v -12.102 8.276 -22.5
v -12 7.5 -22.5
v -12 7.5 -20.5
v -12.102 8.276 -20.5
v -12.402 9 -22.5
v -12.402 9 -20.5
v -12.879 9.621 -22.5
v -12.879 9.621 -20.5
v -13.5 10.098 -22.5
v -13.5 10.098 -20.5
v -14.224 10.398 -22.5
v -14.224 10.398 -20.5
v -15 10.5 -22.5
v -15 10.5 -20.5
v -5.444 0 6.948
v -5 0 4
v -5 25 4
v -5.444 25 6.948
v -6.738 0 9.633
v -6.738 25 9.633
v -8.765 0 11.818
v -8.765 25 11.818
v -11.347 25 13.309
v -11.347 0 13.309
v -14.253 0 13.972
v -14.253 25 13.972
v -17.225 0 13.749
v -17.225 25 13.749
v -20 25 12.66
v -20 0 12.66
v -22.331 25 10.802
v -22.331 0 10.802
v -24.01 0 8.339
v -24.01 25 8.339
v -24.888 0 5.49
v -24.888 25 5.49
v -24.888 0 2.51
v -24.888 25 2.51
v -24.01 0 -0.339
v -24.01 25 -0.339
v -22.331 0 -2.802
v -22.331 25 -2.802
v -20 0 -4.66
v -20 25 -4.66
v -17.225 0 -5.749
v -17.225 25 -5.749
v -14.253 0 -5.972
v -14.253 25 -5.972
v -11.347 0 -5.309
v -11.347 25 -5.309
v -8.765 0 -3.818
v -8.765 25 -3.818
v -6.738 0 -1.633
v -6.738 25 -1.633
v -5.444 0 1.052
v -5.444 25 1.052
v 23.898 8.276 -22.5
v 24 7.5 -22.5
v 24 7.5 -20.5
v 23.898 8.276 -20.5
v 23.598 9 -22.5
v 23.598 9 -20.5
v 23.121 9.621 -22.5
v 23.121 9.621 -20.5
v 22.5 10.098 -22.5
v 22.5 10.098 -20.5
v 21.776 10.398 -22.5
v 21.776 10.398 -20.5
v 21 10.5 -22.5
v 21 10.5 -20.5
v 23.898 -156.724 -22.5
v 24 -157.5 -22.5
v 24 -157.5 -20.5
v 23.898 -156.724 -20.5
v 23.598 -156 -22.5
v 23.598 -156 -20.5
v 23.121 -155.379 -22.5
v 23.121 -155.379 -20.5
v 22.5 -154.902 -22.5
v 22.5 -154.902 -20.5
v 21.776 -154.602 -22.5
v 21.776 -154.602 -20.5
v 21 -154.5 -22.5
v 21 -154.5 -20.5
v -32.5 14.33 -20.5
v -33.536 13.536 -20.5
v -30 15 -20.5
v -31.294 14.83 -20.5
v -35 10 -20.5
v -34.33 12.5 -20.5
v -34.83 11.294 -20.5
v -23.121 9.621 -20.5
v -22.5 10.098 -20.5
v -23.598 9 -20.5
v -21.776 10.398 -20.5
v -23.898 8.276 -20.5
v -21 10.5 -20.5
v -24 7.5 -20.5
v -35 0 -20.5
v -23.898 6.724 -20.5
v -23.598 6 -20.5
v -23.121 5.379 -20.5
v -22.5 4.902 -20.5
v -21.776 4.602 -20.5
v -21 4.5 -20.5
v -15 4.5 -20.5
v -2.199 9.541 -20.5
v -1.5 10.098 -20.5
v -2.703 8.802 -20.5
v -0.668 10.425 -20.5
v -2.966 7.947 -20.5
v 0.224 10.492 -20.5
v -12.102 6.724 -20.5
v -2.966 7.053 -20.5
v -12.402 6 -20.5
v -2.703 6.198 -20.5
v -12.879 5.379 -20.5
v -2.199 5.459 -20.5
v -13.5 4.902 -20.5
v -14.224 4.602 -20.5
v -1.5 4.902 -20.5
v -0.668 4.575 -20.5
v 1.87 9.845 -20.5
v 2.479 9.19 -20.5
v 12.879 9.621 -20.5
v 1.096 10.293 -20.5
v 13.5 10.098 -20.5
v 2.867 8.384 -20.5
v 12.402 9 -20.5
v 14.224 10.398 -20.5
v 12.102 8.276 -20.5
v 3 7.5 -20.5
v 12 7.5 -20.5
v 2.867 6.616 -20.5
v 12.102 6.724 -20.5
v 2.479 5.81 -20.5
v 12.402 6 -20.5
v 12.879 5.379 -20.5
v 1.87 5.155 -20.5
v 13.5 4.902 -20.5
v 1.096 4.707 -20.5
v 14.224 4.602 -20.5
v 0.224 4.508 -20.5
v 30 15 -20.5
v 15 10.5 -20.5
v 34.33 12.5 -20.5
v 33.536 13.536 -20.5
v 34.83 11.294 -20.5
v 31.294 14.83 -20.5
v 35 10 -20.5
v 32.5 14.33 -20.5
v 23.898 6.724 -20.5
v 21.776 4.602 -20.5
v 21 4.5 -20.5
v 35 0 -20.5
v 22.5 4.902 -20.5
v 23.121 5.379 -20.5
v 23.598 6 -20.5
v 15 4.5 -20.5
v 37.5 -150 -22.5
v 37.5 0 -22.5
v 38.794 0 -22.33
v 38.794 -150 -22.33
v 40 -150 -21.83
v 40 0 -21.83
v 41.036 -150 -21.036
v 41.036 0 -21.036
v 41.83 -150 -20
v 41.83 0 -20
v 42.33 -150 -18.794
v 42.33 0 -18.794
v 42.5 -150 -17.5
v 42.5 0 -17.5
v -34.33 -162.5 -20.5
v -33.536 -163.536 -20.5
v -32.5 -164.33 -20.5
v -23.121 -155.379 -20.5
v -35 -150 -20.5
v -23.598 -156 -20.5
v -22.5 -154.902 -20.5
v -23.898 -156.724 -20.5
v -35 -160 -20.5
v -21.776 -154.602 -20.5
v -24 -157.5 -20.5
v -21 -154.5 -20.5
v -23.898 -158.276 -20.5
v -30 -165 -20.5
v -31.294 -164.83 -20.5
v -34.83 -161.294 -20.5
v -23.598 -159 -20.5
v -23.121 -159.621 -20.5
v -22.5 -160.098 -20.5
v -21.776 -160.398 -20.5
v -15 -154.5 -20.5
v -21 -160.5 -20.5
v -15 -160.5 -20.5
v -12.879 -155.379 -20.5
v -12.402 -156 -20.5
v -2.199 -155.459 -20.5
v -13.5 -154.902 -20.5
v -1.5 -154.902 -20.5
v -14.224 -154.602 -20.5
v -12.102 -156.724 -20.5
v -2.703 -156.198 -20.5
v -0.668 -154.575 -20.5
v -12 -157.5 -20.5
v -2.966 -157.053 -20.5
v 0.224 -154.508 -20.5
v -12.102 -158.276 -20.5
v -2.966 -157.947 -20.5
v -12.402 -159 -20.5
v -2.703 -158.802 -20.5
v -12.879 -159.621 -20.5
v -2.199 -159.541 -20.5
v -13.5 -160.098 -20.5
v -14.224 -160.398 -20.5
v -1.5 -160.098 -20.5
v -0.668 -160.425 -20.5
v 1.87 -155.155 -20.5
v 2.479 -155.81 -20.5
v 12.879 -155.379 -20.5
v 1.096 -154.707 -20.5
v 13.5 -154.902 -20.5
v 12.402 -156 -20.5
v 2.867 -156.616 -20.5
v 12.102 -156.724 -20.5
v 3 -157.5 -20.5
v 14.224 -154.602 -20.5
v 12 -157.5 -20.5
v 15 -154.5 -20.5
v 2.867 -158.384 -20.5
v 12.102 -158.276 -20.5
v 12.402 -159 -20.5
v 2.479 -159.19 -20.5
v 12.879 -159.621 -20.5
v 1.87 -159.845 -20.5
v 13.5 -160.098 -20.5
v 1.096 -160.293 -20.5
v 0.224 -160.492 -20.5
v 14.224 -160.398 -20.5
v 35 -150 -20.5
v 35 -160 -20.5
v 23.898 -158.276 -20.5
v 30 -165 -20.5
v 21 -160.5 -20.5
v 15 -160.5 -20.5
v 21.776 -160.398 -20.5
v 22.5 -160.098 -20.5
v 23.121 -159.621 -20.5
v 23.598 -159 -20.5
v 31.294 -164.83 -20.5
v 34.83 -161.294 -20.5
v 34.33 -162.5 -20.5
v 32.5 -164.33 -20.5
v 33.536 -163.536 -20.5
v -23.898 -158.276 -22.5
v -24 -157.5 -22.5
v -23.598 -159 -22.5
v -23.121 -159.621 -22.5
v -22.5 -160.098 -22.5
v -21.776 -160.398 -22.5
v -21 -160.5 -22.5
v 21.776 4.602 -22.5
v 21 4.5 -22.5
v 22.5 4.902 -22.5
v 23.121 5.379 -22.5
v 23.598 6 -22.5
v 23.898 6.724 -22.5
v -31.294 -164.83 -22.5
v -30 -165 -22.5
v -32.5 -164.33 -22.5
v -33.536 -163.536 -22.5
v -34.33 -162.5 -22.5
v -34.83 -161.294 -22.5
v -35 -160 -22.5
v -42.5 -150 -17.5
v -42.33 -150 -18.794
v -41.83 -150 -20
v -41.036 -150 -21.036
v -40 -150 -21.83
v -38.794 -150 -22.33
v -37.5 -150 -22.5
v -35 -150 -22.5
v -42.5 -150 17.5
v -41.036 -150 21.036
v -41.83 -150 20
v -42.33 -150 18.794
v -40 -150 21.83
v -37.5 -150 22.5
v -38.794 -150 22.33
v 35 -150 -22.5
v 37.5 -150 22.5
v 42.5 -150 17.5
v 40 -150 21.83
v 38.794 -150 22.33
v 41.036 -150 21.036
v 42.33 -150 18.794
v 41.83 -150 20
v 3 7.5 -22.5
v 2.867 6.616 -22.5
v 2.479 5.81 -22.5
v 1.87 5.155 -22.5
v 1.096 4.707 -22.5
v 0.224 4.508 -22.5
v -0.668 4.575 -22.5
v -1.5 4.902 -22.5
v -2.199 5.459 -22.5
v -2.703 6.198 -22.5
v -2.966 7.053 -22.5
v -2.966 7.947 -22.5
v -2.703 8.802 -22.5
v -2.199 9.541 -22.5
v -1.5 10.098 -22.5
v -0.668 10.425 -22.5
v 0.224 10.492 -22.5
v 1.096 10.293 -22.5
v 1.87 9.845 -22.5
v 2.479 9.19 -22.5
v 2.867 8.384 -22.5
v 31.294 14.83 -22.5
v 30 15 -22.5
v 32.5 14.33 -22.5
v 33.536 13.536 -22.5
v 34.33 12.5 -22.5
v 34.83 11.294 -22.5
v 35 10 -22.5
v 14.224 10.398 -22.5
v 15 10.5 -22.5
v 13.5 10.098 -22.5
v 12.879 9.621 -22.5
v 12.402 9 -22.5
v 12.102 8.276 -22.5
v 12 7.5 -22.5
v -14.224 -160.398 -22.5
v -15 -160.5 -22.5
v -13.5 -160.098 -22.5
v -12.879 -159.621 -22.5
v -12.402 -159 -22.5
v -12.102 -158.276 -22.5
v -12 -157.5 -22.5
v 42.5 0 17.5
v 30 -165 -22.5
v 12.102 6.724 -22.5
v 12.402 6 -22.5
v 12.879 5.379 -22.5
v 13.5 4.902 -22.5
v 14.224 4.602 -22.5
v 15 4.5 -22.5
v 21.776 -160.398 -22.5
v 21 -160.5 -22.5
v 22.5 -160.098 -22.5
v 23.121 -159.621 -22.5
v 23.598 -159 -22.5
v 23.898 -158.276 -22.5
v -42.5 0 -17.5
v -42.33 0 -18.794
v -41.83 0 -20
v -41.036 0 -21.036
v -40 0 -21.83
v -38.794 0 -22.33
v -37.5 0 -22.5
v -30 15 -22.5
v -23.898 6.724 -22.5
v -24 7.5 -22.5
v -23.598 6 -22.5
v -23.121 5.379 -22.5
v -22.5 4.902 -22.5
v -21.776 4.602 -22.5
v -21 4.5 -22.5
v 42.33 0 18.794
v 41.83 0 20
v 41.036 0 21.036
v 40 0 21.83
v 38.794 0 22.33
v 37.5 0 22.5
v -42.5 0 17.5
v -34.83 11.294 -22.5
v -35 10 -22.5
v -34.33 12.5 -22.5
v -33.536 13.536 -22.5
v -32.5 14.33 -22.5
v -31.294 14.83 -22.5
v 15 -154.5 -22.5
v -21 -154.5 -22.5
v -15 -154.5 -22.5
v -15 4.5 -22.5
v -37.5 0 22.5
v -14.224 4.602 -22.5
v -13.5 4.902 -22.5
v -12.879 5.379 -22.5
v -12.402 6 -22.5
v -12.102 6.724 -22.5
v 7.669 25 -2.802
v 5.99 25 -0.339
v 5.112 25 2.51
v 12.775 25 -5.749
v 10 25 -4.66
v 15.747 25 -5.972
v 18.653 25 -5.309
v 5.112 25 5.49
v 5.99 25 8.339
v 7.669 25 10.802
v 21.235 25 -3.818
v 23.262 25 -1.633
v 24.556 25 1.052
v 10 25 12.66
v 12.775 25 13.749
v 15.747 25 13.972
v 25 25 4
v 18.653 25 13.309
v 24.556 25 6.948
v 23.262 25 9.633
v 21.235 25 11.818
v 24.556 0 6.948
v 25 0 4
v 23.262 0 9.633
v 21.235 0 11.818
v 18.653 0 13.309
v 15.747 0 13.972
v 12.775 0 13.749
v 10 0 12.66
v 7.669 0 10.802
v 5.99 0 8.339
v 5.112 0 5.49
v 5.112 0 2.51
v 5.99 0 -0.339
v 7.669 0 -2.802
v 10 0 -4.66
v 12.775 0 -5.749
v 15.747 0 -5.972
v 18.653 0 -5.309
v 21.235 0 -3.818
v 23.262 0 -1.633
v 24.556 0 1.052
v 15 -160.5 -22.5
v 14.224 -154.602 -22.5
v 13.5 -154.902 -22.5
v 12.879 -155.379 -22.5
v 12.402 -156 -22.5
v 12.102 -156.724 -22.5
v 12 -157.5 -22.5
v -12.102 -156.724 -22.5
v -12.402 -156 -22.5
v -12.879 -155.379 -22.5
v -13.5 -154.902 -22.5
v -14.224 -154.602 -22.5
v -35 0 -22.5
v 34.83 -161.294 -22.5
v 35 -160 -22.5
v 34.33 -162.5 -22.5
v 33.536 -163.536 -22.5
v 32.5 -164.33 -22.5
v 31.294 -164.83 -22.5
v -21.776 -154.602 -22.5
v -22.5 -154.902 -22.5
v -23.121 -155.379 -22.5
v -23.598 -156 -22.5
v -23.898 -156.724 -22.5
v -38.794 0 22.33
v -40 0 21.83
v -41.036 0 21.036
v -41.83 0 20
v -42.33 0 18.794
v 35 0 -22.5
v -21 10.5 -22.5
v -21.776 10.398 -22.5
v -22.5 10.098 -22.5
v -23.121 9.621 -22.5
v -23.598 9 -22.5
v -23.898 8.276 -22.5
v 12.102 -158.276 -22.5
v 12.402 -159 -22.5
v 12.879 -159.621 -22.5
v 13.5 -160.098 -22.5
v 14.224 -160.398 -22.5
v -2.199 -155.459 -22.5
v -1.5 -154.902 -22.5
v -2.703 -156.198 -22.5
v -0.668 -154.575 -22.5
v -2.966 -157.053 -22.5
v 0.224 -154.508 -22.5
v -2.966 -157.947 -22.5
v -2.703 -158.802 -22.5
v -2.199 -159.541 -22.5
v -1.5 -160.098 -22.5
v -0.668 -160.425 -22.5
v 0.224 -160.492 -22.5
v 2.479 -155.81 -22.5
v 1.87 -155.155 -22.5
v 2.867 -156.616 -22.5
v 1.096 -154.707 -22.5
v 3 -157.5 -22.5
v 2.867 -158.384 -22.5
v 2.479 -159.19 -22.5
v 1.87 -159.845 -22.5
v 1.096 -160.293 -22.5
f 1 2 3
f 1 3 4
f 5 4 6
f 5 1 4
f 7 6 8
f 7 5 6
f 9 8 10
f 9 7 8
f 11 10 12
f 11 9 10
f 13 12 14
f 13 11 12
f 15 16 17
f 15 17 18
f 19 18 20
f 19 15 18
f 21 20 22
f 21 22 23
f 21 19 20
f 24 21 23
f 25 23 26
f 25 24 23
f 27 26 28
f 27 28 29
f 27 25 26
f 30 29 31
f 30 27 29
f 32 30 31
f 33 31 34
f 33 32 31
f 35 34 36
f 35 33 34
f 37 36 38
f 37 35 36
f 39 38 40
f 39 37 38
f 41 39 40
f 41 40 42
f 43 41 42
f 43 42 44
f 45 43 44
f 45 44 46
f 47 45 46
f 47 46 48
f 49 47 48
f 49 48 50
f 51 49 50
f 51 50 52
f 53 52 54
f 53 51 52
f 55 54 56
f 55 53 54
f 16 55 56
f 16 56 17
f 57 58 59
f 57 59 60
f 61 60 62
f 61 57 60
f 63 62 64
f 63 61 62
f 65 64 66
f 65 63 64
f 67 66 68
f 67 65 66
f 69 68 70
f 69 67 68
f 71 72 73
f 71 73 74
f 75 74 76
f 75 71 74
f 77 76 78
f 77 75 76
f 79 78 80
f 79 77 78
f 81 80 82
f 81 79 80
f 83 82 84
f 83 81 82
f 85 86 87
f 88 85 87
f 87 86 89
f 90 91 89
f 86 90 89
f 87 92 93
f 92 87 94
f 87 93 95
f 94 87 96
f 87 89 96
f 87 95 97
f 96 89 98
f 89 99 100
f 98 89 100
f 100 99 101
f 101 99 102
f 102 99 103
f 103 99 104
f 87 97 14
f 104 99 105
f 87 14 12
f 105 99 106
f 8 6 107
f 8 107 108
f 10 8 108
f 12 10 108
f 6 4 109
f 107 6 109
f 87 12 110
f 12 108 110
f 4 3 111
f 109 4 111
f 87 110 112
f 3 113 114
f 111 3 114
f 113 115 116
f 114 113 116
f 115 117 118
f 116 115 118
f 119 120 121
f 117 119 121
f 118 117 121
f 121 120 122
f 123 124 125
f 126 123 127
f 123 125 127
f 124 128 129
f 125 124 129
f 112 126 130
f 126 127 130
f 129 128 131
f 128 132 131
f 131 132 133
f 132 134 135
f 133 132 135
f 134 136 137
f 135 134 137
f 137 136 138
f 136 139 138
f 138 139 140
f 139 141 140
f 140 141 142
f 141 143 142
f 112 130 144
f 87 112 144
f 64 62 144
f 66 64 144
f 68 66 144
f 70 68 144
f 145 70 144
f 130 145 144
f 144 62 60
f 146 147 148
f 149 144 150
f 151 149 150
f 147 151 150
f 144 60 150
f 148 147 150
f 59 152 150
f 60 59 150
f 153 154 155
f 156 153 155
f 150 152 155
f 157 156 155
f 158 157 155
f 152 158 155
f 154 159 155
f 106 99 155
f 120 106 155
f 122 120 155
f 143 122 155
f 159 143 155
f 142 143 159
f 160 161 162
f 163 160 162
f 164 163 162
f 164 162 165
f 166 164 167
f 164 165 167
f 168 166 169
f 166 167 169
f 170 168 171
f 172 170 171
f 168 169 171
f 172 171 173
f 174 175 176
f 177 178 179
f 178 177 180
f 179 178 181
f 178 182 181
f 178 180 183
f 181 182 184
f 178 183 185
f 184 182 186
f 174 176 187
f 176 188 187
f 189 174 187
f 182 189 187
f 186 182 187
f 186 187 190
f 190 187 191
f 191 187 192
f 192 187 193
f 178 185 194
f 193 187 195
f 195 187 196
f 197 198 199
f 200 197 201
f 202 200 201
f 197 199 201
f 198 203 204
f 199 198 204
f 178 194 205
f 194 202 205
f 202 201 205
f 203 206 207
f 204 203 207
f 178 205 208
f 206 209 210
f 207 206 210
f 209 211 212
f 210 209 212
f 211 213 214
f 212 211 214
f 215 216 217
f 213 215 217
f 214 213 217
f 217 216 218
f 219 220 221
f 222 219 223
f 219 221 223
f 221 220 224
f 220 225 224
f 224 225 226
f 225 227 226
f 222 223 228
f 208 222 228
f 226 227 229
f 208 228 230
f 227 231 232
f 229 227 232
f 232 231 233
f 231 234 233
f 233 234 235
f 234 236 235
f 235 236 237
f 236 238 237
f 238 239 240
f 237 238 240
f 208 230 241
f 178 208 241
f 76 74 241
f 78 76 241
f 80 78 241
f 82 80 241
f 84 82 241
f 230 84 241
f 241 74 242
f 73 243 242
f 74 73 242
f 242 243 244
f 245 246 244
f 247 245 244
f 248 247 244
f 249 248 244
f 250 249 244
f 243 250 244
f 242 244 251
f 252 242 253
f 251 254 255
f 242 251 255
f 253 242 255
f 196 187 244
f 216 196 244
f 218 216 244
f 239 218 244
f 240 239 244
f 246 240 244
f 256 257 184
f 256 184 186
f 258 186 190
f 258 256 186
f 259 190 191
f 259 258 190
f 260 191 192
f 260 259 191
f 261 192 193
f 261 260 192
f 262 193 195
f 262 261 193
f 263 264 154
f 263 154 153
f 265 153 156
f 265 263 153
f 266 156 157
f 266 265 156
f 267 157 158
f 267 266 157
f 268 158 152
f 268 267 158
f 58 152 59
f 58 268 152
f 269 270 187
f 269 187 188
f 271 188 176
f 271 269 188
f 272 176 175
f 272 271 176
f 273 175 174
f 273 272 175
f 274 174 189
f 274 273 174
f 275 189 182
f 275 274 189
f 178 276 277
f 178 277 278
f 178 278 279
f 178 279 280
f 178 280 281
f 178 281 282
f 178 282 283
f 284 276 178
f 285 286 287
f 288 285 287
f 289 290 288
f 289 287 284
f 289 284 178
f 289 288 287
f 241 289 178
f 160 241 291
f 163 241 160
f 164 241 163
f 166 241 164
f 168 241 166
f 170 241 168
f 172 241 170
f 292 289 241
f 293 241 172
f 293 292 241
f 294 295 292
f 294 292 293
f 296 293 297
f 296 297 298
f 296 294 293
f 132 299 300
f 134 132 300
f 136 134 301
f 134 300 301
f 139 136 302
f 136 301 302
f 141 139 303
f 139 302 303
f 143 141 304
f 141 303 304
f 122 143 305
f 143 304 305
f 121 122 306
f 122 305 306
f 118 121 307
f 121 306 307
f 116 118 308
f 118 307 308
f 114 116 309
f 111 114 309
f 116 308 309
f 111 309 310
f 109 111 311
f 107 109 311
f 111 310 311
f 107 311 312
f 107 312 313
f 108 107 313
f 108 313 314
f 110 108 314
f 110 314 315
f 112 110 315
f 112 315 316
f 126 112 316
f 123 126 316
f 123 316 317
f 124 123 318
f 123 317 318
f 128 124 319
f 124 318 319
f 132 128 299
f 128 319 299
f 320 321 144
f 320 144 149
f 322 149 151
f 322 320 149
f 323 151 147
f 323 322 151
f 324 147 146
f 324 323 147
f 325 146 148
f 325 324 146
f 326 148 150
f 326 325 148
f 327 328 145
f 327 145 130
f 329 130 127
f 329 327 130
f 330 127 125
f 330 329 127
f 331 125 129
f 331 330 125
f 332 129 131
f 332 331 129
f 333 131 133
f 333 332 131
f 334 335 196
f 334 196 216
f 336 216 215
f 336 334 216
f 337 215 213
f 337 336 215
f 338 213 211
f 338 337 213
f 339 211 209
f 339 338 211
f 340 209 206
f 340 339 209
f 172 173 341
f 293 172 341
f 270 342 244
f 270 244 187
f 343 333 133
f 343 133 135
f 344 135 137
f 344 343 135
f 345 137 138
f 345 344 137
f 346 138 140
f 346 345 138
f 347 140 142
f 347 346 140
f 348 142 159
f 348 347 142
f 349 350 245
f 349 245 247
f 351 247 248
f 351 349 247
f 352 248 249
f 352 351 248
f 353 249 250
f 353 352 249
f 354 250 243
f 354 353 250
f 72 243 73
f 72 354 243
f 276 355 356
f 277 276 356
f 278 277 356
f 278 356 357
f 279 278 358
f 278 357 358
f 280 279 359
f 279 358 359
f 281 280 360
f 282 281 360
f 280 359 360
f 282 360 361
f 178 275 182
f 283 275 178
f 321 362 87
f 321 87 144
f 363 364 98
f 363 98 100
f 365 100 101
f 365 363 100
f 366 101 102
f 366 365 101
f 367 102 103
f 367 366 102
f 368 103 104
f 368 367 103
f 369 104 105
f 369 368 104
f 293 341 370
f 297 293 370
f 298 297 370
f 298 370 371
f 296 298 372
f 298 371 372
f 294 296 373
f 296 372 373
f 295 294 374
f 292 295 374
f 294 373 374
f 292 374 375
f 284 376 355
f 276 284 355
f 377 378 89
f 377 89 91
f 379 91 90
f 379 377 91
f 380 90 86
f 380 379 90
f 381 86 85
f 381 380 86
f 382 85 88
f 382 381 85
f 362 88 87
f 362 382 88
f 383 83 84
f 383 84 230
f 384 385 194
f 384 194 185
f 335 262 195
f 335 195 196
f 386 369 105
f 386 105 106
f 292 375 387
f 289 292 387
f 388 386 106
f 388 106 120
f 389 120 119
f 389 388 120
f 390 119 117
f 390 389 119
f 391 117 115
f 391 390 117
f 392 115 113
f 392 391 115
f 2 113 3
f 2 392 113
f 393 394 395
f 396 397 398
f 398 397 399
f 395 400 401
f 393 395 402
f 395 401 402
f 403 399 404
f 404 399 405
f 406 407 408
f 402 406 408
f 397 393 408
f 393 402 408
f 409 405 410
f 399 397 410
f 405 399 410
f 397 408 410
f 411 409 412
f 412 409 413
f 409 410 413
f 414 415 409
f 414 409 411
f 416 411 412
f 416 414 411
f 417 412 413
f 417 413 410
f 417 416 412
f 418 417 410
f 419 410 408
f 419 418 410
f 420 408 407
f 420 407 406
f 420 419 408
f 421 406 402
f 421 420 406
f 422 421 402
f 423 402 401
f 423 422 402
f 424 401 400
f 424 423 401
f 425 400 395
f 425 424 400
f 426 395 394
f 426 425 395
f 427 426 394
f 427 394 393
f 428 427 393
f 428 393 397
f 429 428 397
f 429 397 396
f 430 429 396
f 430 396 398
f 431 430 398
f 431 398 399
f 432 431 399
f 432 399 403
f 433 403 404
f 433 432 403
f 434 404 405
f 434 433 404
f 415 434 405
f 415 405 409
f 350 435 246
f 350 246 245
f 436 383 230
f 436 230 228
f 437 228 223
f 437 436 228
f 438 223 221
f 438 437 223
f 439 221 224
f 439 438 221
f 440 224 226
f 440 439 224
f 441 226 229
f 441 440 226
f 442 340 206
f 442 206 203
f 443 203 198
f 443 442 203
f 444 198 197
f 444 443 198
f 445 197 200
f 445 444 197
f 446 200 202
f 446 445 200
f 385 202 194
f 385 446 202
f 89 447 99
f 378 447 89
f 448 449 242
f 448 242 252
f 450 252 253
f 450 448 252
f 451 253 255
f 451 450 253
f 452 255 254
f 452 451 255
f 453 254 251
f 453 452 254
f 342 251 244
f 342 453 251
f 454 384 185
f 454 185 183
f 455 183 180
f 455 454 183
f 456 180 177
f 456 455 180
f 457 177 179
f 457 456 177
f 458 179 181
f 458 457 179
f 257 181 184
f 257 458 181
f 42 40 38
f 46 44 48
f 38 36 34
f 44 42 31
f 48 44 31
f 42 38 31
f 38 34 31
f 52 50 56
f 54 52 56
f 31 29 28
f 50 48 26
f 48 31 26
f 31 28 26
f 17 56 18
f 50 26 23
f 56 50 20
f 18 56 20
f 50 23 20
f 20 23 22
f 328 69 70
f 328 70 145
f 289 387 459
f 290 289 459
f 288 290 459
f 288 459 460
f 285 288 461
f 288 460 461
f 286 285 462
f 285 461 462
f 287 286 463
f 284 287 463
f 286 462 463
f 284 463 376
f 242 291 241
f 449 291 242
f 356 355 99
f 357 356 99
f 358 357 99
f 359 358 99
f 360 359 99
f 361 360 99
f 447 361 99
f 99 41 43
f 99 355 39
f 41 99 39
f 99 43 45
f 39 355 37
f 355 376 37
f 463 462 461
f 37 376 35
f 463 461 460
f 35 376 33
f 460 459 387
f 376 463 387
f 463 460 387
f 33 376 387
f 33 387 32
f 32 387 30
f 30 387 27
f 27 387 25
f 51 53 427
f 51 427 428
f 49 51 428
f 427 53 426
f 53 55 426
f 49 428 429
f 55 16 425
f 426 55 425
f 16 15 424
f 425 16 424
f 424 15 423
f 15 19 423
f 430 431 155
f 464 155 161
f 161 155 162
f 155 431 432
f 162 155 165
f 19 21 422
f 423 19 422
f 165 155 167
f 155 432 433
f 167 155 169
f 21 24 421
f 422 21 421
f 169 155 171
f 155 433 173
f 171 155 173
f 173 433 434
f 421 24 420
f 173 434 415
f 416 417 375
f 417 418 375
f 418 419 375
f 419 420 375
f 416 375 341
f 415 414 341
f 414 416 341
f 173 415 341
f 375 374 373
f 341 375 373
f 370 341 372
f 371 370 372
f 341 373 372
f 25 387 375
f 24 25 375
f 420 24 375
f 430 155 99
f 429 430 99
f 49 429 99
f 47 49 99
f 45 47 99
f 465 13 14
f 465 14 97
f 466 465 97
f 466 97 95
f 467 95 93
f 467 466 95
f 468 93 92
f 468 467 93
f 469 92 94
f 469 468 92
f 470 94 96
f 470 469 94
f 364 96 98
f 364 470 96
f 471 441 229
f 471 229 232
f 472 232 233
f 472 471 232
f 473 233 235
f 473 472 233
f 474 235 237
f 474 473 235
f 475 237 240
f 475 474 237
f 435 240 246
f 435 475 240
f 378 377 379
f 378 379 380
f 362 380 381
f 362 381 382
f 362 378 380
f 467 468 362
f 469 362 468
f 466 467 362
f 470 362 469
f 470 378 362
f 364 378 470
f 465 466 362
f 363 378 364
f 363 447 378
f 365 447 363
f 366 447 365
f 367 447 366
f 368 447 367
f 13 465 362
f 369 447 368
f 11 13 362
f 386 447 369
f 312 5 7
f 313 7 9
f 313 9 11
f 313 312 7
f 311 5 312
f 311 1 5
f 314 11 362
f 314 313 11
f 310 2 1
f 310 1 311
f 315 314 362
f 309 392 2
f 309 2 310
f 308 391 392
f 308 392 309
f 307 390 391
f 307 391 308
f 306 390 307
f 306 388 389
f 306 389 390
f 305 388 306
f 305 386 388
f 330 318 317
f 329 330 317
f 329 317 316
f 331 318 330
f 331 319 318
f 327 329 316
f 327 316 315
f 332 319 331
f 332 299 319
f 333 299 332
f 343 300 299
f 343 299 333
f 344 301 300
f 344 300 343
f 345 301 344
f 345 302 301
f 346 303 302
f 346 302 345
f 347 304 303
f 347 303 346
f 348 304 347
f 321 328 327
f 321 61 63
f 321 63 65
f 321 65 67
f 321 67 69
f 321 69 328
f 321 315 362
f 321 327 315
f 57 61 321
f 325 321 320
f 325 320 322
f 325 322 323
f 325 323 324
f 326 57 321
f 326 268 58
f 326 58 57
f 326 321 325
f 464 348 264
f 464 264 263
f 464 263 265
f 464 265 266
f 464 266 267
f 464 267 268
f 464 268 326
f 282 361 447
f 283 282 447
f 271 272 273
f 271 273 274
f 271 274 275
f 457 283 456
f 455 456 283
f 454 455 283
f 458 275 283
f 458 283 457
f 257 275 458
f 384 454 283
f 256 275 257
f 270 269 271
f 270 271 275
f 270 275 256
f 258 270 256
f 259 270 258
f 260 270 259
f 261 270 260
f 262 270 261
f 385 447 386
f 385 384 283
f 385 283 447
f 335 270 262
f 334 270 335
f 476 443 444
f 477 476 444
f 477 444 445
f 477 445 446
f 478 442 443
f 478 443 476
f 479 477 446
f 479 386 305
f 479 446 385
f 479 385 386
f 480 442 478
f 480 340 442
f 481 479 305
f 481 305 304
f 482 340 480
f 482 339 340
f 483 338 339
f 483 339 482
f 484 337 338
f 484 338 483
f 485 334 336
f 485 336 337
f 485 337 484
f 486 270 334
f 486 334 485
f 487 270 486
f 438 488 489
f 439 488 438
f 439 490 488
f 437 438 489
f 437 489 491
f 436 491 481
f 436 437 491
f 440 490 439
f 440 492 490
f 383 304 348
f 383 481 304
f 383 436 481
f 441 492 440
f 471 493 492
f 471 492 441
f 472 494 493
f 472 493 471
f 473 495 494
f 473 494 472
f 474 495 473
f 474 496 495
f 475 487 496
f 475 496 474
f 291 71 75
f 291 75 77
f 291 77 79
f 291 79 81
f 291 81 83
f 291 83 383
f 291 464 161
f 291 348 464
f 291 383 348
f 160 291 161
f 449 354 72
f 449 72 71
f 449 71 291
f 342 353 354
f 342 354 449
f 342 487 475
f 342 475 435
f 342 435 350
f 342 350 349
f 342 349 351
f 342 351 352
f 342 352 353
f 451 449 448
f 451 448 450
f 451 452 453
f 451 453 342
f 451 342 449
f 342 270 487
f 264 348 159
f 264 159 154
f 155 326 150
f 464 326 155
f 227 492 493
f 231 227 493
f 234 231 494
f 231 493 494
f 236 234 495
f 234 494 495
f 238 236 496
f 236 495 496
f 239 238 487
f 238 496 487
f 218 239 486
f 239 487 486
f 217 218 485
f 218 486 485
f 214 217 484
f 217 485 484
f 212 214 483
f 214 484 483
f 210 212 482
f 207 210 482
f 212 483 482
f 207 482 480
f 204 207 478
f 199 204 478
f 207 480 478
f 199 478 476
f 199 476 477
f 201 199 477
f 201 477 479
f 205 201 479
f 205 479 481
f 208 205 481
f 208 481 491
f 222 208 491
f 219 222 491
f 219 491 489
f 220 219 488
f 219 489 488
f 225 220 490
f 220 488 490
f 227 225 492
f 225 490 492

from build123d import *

# Parameters (mm, degrees)
F1_DEPTH = 150
F2_R     = 3
F3_DEPTH = 2
F4_R     = 10
F5_DEPTH = 25


with BuildPart() as f1:
    # F0 (on Front) → F1 (new body)
    with BuildSketch(Plane.XZ):
        with BuildLine():
            ThreePointArc((42.5, 17.5), (41.035534, 21.035534), (37.5, 22.5))
            Line((37.5, 22.5), (-37.5, 22.5))
            ThreePointArc((-37.5, 22.5), (-41.035534, 21.035534), (-42.5, 17.5))
            Line((-42.5, 17.5), (-42.5, -17.5))
            ThreePointArc((-42.5, -17.5), (-41.035534, -21.035534), (-37.5, -22.5))
            Line((-37.5, -22.5), (37.5, -22.5))
            ThreePointArc((37.5, -22.5), (41.035534, -21.035534), (42.5, -17.5))
            Line((42.5, -17.5), (42.5, 17.5))
        make_face()
    extrude(amount=F1_DEPTH)

    # F2 (on face) → F3 (join)
    with BuildSketch(Plane(origin=(0, 0, -22.5), x_dir=(1, 0, 0), z_dir=(0, 0, -1))):
        with BuildLine():
            Line((30, 165), (-30, 165))
            ThreePointArc((-30, 165), (-33.535534, 163.535534), (-35, 160))
            Line((-35, 160), (-35, -10))
            ThreePointArc((-35, -10), (-33.535534, -13.535534), (-30, -15))
            Line((-30, -15), (30, -15))
            ThreePointArc((30, -15), (33.535534, -13.535534), (35, -10))
            Line((35, -10), (35, 160))
            ThreePointArc((35, 160), (33.535534, 163.535534), (30, 165))
        make_face()
        with BuildLine():
            Line((-21, -4.5), (-15, -4.5))
            ThreePointArc((-15, -4.5), (-12.87868, -5.37868), (-12, -7.5))
            ThreePointArc((-12, -7.5), (-12.87868, -9.62132), (-15, -10.5))
            Line((-15, -10.5), (-21, -10.5))
            ThreePointArc((-21, -10.5), (-23.12132, -9.62132), (-24, -7.5))
            ThreePointArc((-24, -7.5), (-23.12132, -5.37868), (-21, -4.5))
        make_face(mode=Mode.SUBTRACT)
        with Locations((0, -7.5)):
            Circle(F2_R, mode=Mode.SUBTRACT)
        with BuildLine():
            ThreePointArc((24, -7.5), (23.12132, -9.62132), (21, -10.5))
            Line((21, -10.5), (15, -10.5))
            ThreePointArc((15, -10.5), (12.87868, -9.62132), (12, -7.5))
            ThreePointArc((12, -7.5), (12.87868, -5.37868), (15, -4.5))
            Line((15, -4.5), (21, -4.5))
            ThreePointArc((21, -4.5), (23.12132, -5.37868), (24, -7.5))
        make_face(mode=Mode.SUBTRACT)
        with BuildLine():
            Line((-21, 160.5), (-15, 160.5))
            ThreePointArc((-15, 160.5), (-12.87868, 159.62132), (-12, 157.5))
            ThreePointArc((-12, 157.5), (-12.87868, 155.37868), (-15, 154.5))
            Line((-15, 154.5), (-21, 154.5))
            ThreePointArc((-21, 154.5), (-23.12132, 155.37868), (-24, 157.5))
            ThreePointArc((-24, 157.5), (-23.12132, 159.62132), (-21, 160.5))
        make_face(mode=Mode.SUBTRACT)
        with Locations((0, 157.5)):
            Circle(F2_R, mode=Mode.SUBTRACT)
        with BuildLine():
            ThreePointArc((12, 157.5), (12.87868, 159.62132), (15, 160.5))
            Line((15, 160.5), (21, 160.5))
            ThreePointArc((21, 160.5), (23.12132, 159.62132), (24, 157.5))
            ThreePointArc((24, 157.5), (23.12132, 155.37868), (21, 154.5))
            Line((21, 154.5), (15, 154.5))
            ThreePointArc((15, 154.5), (12.87868, 155.37868), (12, 157.5))
        make_face(mode=Mode.SUBTRACT)
    extrude(amount=-F3_DEPTH)

    # F4 (on Front) → F5 (join)
    with BuildSketch(Plane.XZ):
        with Locations((15, 4)):
            Circle(F4_R)
        with Locations((-15, 4)):
            Circle(F4_R)
    extrude(amount=-F5_DEPTH)


solid = f1.part
